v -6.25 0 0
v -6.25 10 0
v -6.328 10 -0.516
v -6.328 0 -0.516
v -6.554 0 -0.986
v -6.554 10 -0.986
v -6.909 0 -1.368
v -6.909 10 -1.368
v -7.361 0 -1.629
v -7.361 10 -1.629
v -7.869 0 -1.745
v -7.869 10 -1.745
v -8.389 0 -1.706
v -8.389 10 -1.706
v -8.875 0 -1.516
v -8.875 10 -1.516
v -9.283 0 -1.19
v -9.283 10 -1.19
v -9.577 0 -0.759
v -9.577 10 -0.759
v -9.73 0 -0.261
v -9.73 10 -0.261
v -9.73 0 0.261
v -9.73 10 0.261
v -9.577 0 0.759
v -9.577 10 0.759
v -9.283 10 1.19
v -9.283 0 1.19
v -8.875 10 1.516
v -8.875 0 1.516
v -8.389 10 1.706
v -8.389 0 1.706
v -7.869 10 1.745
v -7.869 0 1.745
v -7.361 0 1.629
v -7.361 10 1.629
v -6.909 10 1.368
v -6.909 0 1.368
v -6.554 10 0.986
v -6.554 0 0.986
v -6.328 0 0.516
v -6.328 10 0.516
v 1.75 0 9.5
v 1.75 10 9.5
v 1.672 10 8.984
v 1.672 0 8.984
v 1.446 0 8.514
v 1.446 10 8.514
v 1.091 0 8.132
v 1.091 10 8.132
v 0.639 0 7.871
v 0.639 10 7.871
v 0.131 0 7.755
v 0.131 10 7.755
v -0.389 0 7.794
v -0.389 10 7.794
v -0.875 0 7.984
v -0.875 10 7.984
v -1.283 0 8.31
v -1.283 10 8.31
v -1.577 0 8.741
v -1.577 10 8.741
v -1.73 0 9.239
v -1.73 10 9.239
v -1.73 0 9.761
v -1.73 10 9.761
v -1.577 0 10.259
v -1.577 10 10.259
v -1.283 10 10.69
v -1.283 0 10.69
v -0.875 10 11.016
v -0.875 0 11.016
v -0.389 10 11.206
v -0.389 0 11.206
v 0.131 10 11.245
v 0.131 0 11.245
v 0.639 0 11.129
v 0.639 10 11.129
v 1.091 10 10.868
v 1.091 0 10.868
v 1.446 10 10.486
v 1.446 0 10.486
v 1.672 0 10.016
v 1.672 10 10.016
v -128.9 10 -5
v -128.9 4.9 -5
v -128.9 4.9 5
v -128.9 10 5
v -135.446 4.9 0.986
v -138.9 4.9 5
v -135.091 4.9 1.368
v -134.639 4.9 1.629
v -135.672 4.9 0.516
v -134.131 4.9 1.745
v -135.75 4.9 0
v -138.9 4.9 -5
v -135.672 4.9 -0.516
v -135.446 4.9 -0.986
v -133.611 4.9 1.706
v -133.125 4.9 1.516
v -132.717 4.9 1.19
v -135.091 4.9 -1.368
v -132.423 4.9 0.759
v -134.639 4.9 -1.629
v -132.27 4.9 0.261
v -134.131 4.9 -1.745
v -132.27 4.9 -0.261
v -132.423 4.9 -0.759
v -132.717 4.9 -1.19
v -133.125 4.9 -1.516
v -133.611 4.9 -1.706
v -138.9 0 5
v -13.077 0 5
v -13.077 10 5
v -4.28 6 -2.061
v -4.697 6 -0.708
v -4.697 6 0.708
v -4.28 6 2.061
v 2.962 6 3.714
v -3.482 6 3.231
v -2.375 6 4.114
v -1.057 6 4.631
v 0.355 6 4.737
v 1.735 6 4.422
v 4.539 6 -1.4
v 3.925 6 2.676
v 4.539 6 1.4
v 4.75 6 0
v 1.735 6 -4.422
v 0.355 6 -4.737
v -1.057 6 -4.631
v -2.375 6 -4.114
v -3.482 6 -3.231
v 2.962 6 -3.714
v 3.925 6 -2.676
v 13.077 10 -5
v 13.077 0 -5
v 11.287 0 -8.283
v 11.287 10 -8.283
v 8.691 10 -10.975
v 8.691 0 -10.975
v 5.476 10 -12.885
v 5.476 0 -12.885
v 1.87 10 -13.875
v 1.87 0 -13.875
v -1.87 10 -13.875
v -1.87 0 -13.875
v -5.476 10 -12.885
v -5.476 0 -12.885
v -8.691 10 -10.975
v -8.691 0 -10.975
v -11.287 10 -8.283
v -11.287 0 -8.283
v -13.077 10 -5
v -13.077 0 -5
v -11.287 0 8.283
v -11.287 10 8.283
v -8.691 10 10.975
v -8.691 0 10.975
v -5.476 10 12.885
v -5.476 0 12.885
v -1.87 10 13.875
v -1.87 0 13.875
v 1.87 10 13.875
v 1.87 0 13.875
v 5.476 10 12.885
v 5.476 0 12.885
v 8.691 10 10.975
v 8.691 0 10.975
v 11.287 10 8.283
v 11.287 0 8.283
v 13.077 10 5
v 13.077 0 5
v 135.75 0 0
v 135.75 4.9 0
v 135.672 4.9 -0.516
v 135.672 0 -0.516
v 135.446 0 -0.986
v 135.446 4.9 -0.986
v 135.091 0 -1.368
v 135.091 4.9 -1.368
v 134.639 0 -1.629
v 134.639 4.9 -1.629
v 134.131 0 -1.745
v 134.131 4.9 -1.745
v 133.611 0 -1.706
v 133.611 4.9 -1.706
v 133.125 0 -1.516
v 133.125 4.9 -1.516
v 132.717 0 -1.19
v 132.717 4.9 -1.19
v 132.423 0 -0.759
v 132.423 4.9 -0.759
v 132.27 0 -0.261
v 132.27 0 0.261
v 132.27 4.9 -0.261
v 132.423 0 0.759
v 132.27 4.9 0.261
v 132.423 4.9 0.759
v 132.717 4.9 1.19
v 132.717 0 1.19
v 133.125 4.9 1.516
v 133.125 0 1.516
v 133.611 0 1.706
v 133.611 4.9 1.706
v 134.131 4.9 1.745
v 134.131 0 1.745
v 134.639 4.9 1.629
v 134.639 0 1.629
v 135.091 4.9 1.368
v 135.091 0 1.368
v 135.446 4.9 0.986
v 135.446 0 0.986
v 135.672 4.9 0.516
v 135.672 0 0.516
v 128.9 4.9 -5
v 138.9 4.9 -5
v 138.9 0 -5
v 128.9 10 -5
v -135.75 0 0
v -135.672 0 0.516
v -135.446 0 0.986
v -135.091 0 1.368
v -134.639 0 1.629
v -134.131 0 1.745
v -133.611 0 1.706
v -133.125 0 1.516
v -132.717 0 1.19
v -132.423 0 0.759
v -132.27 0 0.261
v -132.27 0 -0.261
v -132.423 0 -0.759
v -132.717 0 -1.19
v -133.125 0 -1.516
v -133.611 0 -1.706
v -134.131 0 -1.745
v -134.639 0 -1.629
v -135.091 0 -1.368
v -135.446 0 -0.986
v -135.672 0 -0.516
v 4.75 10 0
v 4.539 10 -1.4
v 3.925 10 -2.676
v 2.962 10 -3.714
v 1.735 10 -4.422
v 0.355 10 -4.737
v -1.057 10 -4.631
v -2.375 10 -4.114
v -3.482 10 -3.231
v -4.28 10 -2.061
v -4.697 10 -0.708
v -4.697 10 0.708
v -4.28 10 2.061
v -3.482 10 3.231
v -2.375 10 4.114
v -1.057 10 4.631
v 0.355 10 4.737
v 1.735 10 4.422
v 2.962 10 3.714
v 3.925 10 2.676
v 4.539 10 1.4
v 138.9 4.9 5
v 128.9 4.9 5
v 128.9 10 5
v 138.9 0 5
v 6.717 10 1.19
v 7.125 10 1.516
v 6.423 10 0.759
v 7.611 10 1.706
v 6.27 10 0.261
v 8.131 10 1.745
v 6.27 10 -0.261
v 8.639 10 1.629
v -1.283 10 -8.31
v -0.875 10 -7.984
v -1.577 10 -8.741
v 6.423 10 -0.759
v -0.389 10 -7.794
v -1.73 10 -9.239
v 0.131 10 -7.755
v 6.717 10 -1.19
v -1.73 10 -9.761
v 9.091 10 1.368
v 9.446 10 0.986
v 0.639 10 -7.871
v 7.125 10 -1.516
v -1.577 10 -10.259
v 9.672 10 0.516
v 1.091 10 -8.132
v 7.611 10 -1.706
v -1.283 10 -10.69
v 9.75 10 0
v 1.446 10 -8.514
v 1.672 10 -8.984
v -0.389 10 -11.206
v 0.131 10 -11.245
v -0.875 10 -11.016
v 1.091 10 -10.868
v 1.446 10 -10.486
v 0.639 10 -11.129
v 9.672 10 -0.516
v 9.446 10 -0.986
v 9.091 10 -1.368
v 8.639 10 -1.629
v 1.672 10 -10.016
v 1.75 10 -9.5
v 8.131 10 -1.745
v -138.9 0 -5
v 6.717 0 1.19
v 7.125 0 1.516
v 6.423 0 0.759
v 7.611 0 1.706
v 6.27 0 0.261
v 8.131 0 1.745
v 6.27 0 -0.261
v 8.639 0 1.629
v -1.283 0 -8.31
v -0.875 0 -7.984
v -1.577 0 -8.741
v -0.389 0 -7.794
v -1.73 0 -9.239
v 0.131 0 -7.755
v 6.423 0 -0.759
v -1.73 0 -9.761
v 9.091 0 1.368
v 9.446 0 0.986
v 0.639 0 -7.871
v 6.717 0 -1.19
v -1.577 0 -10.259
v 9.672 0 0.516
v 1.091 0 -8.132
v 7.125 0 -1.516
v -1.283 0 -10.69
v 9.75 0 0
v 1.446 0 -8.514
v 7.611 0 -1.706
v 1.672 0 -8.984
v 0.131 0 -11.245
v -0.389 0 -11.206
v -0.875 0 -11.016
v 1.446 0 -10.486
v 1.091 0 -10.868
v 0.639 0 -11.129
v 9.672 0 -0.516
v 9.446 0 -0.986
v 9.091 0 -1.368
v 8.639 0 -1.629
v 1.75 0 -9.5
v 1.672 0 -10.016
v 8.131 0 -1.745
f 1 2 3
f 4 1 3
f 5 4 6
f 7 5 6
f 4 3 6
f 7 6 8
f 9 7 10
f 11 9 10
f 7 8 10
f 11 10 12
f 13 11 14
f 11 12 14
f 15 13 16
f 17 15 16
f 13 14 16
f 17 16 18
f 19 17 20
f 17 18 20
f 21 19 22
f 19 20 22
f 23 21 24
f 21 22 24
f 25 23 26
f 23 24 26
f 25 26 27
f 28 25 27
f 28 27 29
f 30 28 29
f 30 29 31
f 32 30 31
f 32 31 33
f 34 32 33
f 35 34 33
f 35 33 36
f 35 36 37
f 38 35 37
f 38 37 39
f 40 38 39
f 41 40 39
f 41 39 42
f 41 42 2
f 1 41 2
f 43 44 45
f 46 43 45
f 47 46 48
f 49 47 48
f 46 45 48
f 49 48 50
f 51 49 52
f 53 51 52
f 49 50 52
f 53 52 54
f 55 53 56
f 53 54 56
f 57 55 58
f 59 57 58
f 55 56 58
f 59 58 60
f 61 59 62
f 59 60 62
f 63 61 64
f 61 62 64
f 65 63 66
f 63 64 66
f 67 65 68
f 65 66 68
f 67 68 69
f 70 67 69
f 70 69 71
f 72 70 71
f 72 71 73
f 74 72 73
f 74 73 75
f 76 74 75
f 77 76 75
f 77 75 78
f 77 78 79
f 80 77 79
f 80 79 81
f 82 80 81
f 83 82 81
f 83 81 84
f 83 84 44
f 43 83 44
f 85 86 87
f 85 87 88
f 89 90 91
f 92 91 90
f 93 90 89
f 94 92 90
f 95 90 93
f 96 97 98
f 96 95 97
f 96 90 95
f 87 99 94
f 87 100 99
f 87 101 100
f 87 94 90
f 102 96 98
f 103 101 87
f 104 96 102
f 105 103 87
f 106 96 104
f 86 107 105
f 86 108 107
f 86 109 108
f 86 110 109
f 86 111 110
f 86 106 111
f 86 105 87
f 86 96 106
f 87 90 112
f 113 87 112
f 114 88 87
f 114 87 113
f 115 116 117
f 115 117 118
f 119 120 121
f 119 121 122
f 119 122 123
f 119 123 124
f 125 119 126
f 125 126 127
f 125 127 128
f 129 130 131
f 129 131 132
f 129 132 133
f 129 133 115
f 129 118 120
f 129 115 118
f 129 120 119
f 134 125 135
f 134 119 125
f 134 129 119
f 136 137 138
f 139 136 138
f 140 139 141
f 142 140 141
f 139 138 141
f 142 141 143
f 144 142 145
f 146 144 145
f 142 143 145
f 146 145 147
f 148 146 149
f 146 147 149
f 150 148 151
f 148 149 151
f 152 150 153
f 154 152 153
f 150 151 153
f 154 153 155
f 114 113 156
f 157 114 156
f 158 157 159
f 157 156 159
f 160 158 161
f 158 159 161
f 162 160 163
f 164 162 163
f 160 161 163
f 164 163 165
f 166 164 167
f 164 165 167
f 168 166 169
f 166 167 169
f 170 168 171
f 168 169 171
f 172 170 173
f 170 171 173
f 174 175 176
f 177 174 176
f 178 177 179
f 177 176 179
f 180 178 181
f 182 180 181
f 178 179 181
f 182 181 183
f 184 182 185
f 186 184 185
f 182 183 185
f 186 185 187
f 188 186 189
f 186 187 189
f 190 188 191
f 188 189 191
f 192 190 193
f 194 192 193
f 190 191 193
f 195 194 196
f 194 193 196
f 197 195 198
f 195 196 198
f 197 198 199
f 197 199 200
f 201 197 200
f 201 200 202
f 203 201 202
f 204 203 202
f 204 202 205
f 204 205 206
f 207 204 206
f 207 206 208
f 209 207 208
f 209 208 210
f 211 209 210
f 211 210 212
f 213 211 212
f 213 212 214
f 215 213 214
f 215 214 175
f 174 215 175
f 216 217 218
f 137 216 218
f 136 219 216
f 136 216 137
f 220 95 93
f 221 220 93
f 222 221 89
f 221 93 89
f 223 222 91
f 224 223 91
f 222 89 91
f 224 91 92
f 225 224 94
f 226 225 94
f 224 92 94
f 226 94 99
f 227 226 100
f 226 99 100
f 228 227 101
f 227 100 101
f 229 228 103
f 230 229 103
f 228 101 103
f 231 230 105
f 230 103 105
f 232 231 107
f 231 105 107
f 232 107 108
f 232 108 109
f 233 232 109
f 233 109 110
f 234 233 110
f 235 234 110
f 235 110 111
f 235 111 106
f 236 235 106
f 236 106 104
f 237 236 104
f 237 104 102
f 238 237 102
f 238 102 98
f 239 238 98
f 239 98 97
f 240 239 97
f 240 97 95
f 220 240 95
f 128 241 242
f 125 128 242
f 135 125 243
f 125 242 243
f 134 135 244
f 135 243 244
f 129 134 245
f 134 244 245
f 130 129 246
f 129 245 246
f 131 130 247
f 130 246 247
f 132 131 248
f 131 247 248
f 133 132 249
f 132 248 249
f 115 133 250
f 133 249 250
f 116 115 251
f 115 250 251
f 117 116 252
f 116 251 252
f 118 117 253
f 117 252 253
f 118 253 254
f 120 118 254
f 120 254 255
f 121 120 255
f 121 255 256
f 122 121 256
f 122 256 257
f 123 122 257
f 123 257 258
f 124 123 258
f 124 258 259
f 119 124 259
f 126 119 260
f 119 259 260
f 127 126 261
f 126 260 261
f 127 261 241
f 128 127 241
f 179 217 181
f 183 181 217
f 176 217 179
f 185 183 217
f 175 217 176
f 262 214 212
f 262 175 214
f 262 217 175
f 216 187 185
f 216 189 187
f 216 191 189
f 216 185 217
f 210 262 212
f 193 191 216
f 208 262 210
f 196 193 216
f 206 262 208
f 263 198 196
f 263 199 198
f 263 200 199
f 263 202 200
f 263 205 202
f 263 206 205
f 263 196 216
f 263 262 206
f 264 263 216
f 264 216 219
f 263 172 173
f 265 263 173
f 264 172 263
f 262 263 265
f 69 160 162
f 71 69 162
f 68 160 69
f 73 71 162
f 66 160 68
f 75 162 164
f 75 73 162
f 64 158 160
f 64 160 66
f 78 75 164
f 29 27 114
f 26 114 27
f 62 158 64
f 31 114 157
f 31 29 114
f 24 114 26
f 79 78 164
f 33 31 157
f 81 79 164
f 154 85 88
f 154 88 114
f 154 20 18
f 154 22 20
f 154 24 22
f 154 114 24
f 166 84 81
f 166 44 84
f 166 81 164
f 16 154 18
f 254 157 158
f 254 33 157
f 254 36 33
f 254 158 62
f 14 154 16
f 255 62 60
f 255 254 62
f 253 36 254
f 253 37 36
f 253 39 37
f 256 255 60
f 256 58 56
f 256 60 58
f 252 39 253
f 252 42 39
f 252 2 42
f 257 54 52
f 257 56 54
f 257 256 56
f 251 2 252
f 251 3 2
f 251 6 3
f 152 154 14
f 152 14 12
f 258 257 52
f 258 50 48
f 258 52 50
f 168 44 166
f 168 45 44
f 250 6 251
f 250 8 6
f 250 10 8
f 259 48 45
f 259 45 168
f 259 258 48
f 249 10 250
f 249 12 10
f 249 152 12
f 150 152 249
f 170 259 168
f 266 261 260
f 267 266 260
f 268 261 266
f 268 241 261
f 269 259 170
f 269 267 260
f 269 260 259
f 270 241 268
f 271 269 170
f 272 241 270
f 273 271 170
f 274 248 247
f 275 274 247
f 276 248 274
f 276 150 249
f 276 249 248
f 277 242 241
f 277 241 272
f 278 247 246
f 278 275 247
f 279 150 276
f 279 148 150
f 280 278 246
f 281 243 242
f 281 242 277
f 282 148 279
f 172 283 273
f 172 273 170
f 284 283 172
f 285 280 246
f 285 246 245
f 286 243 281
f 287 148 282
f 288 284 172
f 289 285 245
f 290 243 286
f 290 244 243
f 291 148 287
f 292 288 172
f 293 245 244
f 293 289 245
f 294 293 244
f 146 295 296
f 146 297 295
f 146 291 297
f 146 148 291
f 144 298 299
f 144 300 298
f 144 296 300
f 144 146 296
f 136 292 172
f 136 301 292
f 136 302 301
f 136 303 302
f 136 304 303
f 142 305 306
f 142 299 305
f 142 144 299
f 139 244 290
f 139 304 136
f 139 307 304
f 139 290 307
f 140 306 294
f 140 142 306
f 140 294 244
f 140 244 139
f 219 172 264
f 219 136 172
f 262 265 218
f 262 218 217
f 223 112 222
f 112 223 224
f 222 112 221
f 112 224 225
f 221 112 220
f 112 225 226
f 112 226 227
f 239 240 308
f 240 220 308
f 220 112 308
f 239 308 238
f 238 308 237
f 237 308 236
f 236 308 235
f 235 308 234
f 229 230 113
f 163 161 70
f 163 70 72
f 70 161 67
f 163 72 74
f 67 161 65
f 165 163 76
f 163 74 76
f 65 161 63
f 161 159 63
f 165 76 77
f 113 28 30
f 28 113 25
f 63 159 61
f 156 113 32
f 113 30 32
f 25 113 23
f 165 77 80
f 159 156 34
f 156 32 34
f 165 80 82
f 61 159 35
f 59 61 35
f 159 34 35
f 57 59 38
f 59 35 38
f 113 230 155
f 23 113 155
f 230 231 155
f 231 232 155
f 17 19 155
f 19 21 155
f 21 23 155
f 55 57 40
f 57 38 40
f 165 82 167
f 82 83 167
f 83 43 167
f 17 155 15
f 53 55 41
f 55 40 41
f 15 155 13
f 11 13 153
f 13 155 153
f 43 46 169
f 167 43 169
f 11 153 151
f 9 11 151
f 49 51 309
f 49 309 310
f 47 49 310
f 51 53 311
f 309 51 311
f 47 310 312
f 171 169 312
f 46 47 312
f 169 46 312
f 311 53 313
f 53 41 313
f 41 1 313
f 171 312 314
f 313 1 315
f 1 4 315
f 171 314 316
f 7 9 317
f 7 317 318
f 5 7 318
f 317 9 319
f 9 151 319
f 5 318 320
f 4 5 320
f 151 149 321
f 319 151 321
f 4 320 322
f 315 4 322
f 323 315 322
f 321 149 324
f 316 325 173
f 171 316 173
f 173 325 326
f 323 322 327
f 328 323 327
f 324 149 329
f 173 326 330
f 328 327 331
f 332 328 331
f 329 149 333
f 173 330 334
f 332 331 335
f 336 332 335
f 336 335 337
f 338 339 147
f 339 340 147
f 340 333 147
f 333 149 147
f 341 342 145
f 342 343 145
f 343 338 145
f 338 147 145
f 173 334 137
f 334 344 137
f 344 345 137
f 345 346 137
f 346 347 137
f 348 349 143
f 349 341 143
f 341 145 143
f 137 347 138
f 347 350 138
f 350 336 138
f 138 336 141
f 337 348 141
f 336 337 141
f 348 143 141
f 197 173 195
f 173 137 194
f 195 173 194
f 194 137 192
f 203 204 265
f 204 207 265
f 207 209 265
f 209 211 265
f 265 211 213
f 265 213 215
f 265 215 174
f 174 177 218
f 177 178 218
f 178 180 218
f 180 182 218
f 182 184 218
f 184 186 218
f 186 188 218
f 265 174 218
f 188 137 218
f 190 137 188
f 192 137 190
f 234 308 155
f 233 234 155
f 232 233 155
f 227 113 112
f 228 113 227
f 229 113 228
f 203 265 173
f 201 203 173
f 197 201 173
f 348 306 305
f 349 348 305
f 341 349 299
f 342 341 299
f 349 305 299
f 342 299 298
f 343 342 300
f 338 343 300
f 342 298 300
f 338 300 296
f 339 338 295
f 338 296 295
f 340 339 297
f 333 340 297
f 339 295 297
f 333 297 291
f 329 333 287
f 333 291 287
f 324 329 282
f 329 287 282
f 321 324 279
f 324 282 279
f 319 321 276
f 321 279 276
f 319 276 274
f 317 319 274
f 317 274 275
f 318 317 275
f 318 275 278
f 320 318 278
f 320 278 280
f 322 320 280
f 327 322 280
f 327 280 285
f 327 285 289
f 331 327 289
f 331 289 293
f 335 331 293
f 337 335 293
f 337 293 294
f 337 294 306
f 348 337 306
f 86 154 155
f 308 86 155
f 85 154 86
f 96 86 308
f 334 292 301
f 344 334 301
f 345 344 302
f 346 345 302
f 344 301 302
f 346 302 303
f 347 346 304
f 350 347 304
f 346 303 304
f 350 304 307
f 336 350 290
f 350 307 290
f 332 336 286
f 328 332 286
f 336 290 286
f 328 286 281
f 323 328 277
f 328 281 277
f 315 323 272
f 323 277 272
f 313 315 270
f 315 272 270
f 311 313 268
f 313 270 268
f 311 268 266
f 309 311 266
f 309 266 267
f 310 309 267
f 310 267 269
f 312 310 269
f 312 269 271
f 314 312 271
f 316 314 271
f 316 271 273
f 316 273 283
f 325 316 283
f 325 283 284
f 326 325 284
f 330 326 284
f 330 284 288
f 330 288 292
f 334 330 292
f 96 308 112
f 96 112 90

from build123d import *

# Parameters (mm, degrees)
SKETCH1_R           = 14
BOSS_EXTRUDE1_DEPTH = 10
BOSS_EXTRUDE2_DEPTH = 10
CUT_EXTRUDE2_DEPTH  = 20
SKETCH6_R           = 1.75
CUT_EXTRUDE4_DEPTH  = 10
CIRPATTERN2_COUNT   = 2
CIRPATTERN2_ANGLE   = 180
SKETCH5_R           = 1.75
CUT_EXTRUDE3_DEPTH  = 11
SKETCH7_R           = 4.75
CUT_EXTRUDE5_DEPTH  = 4


with BuildPart() as part:
    # Sketch1 → Boss-Extrude1 (new body)
    with BuildSketch(Plane(origin=(0, 0, 0), x_dir=(1, 0, 0), z_dir=(0, 1, 0))):
        Circle(SKETCH1_R)
    extrude(amount=BOSS_EXTRUDE1_DEPTH)

    # Sketch2 → Boss-Extrude2 (add)
    with BuildSketch(Plane(origin=(0, 10, 0), x_dir=(1, 0, 0), z_dir=(0, 1, 0))):
        with BuildLine():
            Line((13.076696831, -5), (149, -5))
            Line((149, -5), (149, 5))
            Line((149, 5), (13.076696831, 5))
            ThreePointArc((13.076696831, 5), (14, 0), (13.076696831, -5))
        make_face()
    boss_extrude2 = extrude(amount=-BOSS_EXTRUDE2_DEPTH)

    # Sketch4 → Cut-Extrude2 (cut, through all)
    with BuildSketch(Plane.XY.offset(5)):
        Polygon((138.9, 0), (138.9, 4.9), (128.9, 4.9), (128.9, 10), (149, 10), (149, 0), align=None)
    cut_extrude2 = extrude(amount=-CUT_EXTRUDE2_DEPTH, mode=Mode.SUBTRACT)

    # Sketch6 → Cut-Extrude4 (cut)
    with BuildSketch(Plane(origin=(0, 4.9, 0), x_dir=(1, 0, 0), z_dir=(0, 1, 0))):
        with Locations((134, 0)):
            Circle(SKETCH6_R)
    cut_extrude4 = extrude(amount=-CUT_EXTRUDE4_DEPTH, mode=Mode.SUBTRACT)

    # CirPattern2: Boss-Extrude2, Cut-Extrude2, Cut-Extrude4 ×2 about axis
    cirpattern2_axis = Axis((0, 0, 0), (0, 1, 0))
    for i in range(1, CIRPATTERN2_COUNT):
        add(boss_extrude2.rotate(cirpattern2_axis, i * CIRPATTERN2_ANGLE / (CIRPATTERN2_COUNT - 1)))
        add(cut_extrude2.rotate(cirpattern2_axis, i * CIRPATTERN2_ANGLE / (CIRPATTERN2_COUNT - 1)), mode=Mode.SUBTRACT)
        add(cut_extrude4.rotate(cirpattern2_axis, i * CIRPATTERN2_ANGLE / (CIRPATTERN2_COUNT - 1)), mode=Mode.SUBTRACT)

    # Sketch5 → Cut-Extrude3 (cut, through all)
    with BuildSketch(Plane(origin=(0, 10, 0), x_dir=(1, 0, 0), z_dir=(0, 1, 0))):
        with Locations((0, 9.5)):
            Circle(SKETCH5_R)
        with Locations((8, 0)):
            Circle(SKETCH5_R)
        with Locations((-8, 0)):
            Circle(SKETCH5_R)
        with Locations((0, -9.5)):
            Circle(SKETCH5_R)
    extrude(amount=-CUT_EXTRUDE3_DEPTH, mode=Mode.SUBTRACT)

    # Sketch7 → Cut-Extrude5 (cut)
    with BuildSketch(Plane(origin=(0, 10, 0), x_dir=(1, 0, 0), z_dir=(0, 1, 0))):
        Circle(SKETCH7_R)
    extrude(amount=-CUT_EXTRUDE5_DEPTH, mode=Mode.SUBTRACT)


solid = part.part
